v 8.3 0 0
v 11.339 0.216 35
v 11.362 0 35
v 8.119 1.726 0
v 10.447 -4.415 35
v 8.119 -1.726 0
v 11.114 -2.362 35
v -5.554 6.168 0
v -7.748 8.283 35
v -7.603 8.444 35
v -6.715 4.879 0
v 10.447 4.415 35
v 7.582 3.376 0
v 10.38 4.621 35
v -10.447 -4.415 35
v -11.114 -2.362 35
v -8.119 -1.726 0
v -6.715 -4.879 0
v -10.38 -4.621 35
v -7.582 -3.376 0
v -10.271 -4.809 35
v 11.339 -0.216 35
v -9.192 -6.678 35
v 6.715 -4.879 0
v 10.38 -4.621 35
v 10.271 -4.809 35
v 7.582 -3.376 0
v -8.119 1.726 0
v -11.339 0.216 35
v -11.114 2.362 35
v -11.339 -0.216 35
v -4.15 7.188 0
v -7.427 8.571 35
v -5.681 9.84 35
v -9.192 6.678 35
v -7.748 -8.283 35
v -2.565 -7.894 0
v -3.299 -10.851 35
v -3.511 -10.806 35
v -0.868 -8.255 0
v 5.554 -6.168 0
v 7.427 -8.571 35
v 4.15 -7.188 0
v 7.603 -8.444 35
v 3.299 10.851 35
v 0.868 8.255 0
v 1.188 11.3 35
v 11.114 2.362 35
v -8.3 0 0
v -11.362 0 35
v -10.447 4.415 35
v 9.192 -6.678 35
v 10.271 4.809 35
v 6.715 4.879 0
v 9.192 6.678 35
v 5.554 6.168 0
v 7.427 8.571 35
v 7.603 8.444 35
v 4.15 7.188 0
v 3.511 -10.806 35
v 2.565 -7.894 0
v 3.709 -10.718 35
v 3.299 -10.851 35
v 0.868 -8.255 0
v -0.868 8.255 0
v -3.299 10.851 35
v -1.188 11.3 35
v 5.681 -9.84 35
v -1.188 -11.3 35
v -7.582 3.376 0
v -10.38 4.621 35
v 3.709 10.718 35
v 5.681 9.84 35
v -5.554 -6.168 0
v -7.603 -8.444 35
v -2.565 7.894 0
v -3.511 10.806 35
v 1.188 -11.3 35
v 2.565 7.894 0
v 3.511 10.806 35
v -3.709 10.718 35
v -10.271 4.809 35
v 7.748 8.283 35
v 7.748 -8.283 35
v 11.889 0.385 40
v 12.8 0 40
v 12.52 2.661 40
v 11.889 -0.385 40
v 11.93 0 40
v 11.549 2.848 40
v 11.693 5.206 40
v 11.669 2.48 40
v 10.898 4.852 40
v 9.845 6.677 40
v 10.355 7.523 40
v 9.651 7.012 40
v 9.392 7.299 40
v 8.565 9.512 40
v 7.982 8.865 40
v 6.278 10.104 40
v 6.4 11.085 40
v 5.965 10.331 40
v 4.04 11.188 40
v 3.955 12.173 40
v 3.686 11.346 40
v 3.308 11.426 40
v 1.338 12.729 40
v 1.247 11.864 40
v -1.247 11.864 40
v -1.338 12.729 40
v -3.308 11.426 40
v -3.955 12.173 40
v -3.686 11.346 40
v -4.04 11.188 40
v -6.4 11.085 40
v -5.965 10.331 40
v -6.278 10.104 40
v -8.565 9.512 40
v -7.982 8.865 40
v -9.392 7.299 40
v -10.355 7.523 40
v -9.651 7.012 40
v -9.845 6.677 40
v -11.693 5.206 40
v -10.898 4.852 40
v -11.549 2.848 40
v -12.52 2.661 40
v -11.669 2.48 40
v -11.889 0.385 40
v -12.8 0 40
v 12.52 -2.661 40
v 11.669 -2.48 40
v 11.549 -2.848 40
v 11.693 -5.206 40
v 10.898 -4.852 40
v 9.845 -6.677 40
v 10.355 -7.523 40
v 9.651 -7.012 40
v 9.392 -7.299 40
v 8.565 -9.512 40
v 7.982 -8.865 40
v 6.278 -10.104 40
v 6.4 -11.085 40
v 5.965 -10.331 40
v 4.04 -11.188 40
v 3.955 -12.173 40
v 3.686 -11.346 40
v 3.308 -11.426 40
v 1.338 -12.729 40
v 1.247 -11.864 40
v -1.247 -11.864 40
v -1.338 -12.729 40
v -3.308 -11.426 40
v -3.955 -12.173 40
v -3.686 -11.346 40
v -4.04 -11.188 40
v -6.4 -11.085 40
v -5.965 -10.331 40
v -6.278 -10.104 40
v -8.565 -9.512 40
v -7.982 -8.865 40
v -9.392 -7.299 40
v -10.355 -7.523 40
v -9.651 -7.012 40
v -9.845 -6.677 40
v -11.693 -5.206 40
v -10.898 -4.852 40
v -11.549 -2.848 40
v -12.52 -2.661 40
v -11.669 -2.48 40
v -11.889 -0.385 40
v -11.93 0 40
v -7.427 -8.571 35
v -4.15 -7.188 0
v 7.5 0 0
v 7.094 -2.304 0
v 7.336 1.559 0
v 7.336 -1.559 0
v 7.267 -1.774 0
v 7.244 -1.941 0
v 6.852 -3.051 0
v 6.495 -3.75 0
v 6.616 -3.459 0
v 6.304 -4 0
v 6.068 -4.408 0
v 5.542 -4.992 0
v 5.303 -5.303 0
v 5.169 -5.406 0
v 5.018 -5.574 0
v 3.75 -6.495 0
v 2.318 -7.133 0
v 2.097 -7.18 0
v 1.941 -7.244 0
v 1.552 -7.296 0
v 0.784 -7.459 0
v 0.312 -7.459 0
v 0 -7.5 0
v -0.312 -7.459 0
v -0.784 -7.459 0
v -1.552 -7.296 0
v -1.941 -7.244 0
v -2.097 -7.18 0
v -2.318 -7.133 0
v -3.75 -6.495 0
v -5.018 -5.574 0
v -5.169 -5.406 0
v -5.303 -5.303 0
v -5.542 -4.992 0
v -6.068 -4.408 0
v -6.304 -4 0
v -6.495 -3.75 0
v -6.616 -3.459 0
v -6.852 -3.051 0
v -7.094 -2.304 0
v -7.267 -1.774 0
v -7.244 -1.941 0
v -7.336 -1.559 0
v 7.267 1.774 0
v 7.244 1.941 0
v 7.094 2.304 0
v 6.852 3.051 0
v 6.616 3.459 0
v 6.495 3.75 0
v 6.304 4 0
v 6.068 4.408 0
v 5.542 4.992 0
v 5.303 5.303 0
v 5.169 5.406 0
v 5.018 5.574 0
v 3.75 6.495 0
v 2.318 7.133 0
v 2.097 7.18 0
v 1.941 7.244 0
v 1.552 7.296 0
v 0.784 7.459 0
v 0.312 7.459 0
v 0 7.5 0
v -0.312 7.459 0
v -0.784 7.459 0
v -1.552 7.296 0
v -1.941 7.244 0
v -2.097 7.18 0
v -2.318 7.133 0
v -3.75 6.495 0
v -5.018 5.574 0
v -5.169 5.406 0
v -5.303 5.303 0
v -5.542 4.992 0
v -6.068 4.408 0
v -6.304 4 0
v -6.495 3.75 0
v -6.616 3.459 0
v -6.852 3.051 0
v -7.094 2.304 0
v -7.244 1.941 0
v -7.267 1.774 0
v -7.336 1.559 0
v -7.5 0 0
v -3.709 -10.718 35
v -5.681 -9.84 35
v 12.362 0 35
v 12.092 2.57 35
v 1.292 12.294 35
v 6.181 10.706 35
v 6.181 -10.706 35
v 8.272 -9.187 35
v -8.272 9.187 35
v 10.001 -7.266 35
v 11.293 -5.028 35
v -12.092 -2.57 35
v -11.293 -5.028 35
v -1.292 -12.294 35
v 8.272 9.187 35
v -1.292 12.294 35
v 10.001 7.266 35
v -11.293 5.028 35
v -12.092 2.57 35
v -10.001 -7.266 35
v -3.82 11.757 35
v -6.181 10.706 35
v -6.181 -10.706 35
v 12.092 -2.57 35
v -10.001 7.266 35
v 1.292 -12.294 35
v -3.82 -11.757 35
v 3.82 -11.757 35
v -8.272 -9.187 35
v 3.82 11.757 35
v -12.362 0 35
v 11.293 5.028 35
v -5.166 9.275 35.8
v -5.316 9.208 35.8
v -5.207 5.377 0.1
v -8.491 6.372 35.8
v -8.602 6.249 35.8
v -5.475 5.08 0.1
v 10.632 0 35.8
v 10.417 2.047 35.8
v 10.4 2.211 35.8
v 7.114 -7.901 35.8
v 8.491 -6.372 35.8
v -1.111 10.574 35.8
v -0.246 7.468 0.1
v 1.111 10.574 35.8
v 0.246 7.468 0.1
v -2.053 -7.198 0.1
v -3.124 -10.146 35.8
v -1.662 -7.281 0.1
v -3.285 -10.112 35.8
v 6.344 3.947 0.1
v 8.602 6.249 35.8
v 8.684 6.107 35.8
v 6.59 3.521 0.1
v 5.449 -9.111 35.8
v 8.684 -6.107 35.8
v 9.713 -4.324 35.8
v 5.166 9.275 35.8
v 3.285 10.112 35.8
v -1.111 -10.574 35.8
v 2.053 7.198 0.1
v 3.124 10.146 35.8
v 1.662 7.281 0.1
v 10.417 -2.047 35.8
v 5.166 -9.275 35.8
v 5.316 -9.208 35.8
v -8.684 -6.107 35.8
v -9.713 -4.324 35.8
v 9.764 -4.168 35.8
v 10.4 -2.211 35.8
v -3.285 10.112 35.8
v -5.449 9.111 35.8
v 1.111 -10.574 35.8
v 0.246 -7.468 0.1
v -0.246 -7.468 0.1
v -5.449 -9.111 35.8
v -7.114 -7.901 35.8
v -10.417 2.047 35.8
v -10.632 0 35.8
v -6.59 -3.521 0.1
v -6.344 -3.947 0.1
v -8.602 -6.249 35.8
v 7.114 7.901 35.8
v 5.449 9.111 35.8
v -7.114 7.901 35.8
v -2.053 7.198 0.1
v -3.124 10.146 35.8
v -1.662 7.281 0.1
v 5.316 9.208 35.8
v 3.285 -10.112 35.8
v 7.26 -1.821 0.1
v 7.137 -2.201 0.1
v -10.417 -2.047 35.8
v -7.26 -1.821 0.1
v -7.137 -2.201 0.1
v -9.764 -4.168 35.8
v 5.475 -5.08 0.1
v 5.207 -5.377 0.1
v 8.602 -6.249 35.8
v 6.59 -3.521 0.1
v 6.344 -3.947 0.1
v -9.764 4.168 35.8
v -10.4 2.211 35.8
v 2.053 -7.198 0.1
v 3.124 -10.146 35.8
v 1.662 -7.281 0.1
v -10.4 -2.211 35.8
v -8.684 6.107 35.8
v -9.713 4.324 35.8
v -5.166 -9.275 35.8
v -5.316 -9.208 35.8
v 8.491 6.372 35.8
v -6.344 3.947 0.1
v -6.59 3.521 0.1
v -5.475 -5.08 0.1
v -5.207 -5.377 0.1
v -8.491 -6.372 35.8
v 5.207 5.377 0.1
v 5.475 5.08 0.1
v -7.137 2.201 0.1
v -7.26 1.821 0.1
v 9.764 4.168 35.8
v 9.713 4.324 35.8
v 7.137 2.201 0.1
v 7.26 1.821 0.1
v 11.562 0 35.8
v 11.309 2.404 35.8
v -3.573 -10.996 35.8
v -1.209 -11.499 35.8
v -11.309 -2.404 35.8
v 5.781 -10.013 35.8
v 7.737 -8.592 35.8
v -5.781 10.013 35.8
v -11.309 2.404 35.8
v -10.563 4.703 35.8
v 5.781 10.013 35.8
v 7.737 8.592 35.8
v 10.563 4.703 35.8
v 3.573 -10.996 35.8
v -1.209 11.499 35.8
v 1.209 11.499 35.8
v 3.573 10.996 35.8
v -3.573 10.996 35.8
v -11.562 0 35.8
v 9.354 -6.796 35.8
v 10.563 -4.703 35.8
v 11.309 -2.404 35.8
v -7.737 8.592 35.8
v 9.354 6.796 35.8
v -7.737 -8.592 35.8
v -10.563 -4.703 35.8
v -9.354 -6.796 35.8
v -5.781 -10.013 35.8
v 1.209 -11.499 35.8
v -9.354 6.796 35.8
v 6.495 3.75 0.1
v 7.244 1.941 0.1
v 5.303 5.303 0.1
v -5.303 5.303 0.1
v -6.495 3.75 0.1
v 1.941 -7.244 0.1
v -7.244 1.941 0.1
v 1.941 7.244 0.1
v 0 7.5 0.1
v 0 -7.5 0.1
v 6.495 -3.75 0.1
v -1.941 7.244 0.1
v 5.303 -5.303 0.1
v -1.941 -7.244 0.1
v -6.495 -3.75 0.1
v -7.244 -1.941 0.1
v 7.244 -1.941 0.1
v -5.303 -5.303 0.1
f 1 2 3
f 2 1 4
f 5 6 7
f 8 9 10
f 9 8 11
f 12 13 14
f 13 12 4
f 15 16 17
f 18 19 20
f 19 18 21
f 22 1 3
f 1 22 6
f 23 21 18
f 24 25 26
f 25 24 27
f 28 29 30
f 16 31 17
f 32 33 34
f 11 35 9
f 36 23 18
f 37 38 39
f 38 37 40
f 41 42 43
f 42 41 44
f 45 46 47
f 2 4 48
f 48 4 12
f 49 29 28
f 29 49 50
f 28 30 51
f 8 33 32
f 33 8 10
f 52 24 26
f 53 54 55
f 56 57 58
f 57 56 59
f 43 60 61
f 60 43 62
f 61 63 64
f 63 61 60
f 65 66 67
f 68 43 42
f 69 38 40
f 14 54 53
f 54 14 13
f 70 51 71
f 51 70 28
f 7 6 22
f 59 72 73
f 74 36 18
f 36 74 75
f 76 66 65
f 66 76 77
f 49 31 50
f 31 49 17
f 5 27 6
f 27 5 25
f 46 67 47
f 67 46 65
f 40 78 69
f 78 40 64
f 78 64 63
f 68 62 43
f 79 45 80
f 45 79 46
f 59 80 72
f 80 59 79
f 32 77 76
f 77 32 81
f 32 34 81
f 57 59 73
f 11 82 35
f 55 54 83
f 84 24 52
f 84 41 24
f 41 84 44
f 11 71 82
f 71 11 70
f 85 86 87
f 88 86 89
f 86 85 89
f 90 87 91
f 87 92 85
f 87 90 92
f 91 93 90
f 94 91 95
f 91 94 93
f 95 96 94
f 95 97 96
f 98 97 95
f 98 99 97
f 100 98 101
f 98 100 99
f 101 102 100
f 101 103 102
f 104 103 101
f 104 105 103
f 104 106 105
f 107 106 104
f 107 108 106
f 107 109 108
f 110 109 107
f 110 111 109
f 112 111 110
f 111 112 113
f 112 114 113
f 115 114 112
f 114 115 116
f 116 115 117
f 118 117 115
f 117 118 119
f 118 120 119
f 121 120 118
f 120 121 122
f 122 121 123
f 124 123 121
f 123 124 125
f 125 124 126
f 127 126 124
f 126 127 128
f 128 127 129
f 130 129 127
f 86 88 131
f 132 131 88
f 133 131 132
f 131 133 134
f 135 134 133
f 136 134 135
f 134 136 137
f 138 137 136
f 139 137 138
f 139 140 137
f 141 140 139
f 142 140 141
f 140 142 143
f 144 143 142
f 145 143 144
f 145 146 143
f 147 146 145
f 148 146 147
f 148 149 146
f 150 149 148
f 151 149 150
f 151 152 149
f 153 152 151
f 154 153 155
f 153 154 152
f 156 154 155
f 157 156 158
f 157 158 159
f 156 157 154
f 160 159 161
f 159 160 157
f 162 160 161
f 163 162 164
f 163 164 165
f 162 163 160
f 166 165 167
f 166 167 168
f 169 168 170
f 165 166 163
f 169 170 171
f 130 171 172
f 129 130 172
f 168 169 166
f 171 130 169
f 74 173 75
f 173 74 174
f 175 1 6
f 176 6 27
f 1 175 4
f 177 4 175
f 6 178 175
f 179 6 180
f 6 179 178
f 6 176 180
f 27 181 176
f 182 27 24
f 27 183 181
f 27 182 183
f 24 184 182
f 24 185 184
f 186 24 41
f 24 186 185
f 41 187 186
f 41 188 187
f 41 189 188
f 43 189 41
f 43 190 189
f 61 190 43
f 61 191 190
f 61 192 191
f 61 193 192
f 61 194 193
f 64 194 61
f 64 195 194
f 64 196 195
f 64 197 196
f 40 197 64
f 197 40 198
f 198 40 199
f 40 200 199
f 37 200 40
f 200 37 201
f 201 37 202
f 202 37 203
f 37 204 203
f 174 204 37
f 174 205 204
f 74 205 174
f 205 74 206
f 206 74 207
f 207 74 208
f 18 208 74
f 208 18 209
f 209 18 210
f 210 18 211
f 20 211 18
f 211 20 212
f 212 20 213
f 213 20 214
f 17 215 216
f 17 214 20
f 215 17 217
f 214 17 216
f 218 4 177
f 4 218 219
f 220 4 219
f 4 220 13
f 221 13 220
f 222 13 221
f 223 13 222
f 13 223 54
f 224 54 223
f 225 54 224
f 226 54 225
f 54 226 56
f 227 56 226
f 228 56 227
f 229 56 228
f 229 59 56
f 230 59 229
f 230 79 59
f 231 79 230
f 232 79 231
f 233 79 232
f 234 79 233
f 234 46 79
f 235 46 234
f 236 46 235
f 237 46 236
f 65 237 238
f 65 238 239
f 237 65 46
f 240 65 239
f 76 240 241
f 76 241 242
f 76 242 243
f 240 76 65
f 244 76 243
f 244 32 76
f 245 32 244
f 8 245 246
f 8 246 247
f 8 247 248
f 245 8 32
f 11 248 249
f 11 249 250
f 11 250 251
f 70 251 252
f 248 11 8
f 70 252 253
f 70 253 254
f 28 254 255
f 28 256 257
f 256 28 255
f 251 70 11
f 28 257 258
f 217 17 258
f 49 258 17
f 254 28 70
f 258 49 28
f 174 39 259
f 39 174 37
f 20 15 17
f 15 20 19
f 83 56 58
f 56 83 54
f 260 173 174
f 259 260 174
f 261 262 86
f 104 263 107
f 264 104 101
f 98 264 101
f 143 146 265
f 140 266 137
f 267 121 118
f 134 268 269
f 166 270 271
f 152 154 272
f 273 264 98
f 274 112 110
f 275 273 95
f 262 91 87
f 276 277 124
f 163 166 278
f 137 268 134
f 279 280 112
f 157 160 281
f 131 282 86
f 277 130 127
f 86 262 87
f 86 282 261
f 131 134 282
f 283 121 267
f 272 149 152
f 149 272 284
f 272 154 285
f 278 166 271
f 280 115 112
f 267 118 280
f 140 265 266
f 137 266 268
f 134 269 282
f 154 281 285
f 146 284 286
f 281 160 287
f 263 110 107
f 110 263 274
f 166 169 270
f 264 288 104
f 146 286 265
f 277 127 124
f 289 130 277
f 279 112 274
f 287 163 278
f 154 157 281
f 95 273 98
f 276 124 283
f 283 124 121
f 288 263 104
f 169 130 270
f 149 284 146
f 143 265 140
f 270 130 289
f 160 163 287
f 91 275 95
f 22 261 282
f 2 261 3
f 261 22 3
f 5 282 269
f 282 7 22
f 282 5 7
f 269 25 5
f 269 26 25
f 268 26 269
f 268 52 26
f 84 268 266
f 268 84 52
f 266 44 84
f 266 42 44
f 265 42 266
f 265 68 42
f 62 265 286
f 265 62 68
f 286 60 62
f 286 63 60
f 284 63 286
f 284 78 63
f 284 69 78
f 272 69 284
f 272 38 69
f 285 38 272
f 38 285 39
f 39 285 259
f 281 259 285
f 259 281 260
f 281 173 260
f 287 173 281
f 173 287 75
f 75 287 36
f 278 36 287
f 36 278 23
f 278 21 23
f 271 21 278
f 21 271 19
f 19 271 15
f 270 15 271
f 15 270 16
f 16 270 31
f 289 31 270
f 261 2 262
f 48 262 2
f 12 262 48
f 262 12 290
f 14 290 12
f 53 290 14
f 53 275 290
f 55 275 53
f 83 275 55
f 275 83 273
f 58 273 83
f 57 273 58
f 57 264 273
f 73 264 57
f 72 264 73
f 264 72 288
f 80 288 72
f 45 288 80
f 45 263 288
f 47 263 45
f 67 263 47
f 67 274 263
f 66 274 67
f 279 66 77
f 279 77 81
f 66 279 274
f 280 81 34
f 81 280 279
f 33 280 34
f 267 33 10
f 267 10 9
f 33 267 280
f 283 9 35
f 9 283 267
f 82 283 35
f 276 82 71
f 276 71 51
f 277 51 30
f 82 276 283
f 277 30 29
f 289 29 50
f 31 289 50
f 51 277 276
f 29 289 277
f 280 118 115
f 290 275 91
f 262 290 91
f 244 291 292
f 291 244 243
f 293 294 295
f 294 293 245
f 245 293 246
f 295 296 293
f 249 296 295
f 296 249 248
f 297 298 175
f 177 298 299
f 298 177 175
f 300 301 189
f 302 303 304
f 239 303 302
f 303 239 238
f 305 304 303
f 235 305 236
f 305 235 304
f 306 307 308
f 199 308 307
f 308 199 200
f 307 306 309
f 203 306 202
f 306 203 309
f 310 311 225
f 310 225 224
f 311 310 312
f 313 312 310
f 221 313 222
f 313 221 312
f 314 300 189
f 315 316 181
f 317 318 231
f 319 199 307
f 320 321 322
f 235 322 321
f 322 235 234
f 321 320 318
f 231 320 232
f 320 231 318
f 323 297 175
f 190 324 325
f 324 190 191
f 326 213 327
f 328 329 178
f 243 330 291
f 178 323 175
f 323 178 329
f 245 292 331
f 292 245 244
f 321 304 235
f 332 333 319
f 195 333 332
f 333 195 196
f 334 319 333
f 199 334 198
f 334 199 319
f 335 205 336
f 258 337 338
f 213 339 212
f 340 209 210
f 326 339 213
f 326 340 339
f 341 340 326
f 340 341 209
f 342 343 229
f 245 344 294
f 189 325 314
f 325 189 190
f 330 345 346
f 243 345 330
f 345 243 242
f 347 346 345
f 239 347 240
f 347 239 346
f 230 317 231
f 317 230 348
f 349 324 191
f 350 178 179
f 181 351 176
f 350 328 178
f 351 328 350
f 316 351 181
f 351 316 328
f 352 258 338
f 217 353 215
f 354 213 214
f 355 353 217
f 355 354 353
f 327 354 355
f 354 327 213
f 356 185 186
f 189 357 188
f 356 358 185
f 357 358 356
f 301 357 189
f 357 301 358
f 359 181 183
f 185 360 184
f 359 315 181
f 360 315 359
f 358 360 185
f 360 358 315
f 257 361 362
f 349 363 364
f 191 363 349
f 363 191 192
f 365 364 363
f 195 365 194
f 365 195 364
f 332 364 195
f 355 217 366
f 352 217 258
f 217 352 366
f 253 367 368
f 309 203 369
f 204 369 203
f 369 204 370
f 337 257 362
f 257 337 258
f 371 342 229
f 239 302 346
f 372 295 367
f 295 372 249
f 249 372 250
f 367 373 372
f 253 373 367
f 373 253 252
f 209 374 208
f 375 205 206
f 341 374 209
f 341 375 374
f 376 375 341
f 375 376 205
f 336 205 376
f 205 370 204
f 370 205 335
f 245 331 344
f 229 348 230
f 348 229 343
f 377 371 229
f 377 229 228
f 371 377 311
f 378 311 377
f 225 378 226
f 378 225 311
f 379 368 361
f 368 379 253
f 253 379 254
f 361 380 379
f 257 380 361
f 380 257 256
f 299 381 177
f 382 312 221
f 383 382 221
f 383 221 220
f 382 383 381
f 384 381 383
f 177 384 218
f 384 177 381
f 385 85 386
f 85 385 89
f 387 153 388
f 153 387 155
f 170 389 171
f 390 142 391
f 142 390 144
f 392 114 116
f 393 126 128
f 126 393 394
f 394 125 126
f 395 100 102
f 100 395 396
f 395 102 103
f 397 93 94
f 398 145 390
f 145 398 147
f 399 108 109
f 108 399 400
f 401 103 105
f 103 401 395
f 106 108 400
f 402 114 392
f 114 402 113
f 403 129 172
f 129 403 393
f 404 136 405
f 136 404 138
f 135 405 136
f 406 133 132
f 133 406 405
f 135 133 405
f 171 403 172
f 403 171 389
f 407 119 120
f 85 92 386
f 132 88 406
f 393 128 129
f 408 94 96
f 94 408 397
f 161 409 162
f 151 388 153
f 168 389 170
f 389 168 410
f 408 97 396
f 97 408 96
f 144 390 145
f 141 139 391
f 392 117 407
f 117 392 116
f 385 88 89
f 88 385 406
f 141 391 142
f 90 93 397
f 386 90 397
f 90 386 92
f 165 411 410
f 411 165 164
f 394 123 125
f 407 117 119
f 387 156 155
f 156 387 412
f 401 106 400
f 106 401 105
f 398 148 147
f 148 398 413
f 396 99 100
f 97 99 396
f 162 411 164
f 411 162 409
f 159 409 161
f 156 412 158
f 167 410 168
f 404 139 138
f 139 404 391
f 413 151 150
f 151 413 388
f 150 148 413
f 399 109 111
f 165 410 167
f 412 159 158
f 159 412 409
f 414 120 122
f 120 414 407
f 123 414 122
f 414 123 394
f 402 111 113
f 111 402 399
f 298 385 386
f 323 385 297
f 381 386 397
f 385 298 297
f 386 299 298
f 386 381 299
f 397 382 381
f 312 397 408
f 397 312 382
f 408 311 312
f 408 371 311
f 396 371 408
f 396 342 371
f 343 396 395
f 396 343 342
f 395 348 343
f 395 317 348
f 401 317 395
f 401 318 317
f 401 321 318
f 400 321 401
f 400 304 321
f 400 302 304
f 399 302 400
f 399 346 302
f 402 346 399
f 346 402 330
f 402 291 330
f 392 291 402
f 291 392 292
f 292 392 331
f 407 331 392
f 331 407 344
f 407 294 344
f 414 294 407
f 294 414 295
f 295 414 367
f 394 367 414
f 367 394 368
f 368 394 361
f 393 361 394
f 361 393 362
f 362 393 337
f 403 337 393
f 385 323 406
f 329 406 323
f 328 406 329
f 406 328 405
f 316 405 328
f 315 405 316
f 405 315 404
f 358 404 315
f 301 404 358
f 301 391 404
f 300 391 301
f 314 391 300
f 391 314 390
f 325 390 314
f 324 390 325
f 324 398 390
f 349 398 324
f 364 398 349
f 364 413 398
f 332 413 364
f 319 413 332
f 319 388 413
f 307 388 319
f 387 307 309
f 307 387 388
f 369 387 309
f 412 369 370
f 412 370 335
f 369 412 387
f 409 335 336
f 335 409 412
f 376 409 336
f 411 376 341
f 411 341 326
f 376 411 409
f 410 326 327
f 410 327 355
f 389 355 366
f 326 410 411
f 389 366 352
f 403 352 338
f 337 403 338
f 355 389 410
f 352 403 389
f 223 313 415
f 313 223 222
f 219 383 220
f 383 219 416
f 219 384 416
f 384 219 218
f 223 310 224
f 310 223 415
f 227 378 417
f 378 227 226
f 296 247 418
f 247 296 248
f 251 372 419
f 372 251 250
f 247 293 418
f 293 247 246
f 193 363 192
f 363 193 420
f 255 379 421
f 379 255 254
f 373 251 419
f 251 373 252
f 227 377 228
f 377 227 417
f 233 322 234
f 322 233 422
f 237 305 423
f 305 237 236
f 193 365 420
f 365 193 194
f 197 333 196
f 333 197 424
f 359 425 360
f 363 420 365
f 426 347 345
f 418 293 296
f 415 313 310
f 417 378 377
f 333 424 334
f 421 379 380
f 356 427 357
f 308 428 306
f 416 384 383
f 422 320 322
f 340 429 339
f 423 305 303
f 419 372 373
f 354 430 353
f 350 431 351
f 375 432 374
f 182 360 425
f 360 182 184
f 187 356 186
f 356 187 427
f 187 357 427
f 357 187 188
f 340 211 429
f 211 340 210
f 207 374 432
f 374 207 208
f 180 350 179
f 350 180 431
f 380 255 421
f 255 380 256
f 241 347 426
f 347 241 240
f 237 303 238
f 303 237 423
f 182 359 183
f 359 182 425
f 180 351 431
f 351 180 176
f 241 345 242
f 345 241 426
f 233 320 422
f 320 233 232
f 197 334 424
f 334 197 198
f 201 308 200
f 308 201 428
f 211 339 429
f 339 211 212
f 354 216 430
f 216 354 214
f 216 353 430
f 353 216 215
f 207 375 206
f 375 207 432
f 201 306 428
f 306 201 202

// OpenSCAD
//debris chute
//https://de.m.wikipedia.org/wiki/Bauschutt#/media/Datei%3AStecksystem_zum_Abtransport_von_Bauschutt.JPG

/* [Dimensions] */
wallThck=0.8;
ovHght=40;
brimHght=5;
brimThck=1.0;
minDia=15;
flankAng=5;
stckHght=10;
spcng=0.2;

/* [show] */
showAsy=false;
sectionCut="none"; //["none","X-Z"]

/* [Hidden] */
fudge=0.1;

upperDia=tan(flankAng)*ovHght*2+minDia; //upper Diameter from height and angle
brimLowerDia=upperDia+brimThck*2-tan(flankAng)*brimHght*2;
ovDia=upperDia+(brimThck+wallThck)*2;
sectCubeDims=[ovDia+fudge,ovDia/2+fudge,ovHght+fudge];

if (showAsy)
  for (iz=[0:3])
    translate([0,0,iz*(stckHght+spcng)]) cone();
else    
  cone();

module cone(cut=false){
  difference(){
    union(){
    cylinder(d1=minDia+wallThck*2,d2=upperDia+wallThck*2,h=ovHght);
    translate([0,0,ovHght-brimHght]) cylinder(d1=brimLowerDia+wallThck*2,d2=upperDia+brimThck*2+wallThck*2,brimHght);
    }
    cylinder(d1=minDia,d2=upperDia,h=ovHght);
    translate([0,0,ovHght-brimHght+wallThck]) cylinder(d1=brimLowerDia,d2=upperDia+brimThck*2,brimHght);
    translate([0,0,-fudge]) cylinder(d=minDia,h=fudge*2);
    if (sectionCut=="X-Z") 
      color("darkRed") translate([0,-sectCubeDims.y/2,ovHght/2]) 
        cube(sectCubeDims,true);
  }
}
